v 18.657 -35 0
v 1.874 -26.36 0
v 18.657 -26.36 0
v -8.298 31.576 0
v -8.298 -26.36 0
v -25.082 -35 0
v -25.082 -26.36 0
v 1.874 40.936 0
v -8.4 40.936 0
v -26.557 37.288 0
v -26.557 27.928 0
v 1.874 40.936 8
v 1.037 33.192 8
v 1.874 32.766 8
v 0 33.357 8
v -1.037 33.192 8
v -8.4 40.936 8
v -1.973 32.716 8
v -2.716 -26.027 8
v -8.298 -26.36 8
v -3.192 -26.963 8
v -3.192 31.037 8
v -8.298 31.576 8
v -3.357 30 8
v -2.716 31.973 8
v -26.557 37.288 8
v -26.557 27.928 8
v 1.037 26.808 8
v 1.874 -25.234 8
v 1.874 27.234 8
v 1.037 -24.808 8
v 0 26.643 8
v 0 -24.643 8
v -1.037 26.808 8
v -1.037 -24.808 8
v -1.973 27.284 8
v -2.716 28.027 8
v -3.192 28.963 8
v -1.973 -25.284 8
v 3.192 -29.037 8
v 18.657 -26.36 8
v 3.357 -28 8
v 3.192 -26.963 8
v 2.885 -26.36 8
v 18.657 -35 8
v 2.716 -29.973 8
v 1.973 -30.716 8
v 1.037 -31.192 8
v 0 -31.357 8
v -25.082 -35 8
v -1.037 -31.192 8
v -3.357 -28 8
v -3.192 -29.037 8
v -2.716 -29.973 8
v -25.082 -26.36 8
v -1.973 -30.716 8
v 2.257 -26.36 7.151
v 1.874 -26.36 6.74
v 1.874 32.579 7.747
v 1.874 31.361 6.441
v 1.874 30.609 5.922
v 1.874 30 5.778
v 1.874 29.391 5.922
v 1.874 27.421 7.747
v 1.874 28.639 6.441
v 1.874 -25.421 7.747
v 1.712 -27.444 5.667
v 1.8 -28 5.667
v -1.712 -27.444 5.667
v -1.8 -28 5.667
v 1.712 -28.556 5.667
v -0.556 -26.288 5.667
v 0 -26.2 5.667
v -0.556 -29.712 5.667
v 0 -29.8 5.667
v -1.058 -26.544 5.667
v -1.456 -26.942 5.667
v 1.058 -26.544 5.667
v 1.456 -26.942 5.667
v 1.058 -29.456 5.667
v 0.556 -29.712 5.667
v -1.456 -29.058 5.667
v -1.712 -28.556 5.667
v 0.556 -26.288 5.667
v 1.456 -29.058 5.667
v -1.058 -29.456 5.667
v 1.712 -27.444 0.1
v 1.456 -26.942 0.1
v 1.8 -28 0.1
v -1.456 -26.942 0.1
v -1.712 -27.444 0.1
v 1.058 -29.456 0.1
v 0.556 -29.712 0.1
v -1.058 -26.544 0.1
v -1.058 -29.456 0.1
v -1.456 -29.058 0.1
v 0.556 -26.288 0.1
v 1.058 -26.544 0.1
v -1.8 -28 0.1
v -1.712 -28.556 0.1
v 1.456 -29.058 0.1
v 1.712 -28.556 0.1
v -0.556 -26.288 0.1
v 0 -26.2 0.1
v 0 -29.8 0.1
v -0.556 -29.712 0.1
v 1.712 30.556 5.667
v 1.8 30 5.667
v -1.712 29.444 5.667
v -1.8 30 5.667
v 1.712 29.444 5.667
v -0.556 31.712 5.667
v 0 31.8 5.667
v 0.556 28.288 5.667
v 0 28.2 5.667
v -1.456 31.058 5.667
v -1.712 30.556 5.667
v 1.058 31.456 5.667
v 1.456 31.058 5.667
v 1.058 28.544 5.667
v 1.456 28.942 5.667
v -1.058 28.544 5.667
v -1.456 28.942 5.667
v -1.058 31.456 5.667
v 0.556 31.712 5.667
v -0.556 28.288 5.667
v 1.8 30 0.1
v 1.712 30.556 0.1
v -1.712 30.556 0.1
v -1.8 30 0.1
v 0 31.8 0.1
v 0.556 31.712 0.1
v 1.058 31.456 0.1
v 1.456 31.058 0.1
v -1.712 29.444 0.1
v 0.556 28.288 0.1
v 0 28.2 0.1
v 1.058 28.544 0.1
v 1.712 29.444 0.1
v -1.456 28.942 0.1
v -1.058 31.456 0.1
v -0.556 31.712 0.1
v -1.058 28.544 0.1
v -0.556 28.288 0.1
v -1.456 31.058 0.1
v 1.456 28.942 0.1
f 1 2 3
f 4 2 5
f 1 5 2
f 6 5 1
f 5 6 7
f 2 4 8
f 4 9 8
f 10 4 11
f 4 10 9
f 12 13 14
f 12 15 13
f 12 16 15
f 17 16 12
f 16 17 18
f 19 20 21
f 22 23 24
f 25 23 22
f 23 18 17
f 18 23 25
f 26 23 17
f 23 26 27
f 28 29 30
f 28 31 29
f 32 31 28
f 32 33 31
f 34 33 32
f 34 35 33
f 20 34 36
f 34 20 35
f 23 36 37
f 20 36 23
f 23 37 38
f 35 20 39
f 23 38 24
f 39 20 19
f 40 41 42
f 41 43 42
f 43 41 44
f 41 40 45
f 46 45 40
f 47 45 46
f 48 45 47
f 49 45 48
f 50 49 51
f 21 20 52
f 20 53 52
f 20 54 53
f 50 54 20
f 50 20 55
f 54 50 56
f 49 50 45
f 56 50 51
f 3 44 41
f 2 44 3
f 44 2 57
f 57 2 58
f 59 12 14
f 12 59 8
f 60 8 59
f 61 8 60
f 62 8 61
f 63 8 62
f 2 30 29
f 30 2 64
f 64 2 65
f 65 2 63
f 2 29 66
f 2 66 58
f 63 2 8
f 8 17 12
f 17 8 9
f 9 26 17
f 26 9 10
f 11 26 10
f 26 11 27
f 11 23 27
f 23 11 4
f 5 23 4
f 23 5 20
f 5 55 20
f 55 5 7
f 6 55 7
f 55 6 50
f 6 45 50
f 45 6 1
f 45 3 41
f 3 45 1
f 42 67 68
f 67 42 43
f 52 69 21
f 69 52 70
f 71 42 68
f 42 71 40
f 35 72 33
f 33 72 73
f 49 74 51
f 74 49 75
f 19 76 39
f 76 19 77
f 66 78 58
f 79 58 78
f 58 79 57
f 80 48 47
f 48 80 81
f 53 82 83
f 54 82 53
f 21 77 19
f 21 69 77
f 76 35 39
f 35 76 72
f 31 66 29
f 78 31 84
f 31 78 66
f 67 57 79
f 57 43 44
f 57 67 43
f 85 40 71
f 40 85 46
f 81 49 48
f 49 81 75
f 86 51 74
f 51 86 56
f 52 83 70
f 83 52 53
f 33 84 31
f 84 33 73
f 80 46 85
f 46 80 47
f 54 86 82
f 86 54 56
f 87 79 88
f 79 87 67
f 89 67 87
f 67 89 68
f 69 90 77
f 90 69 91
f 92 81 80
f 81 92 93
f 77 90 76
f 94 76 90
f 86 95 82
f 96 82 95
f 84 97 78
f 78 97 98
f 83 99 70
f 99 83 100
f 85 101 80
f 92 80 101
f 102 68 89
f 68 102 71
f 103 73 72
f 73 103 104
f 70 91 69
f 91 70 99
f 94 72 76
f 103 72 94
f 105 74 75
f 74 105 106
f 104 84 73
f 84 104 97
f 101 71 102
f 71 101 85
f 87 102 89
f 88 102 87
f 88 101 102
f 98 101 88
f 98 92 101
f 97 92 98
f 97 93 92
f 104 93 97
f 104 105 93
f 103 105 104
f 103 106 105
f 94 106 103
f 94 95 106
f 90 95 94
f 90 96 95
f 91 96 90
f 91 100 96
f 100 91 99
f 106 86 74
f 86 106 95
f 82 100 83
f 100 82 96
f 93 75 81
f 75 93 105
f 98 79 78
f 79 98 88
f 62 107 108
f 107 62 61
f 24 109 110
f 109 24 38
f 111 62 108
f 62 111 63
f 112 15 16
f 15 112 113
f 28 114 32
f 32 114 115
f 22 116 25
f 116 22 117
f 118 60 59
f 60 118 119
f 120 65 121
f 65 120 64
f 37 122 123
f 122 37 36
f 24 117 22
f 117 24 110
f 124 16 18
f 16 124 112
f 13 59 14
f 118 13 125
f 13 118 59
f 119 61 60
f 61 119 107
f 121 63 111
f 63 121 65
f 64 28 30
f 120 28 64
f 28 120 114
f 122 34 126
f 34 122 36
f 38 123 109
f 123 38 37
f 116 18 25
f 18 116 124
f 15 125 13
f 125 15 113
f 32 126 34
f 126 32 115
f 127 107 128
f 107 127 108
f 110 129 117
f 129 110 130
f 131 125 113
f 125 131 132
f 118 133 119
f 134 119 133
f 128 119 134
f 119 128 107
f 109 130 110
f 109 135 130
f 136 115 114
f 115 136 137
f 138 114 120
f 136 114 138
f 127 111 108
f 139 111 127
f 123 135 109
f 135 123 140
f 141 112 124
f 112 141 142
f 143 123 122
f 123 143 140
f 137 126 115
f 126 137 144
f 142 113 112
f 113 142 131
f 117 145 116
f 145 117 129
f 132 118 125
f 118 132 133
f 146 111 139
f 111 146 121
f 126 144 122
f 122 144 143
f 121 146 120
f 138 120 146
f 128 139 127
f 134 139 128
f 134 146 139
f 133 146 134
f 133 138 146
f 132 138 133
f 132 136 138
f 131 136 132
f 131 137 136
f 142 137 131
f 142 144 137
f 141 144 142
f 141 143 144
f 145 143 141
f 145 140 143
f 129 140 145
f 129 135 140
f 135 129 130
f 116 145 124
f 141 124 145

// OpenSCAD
// Street Numbers for 3D printing
// Charles Tilford, 2019
// License: CC BY-NC-SA 4.0
//   https://creativecommons.org/licenses/by-nc-sa/4.0/

char="1";     // The number/letter to print

// Units are in mm, except for height of letter

// How many inches high should letter be?
inchesHigh=3;
// How thick/deep should letter be (mm)?
depth=8;

// Character coordinates just center the letter
charX=-38;    // Character X coord
charY=-35;    // Character Y coord
topScrew=30;  // Top screw Y coord
botScrew=-28; // Bottom screw Y coord
height=8;     // Thickness of character
// Screw dimensions. Default presumes
// #6 sheet metal screw
screwWid=3.6; // Width of screw shaft
screwTop=6.78;// Width of screw head
screwCon=5.08;// Height of head 'cone'

// Font to print in. Your system needs this
// installed, of course. If changed the hole
// positions almost certainly need to be
// changed, and maybe charX/charY.
fName="Open Sans Extrabold";
// https://fonts.google.com/specimen/Open+Sans
// Designer: Steve Matteson

// Thin floor below holes. My printer was
// struggling to have the hole 'border' stick
// to the stage. Just drill/screw thru it.
holeFloor=0.1; 

// ==========================================
// ===== All values below are auto-calculated
// ==========================================

// Scaled values
scaleFactor=inchesHigh / 3;
cX=charX * scaleFactor;
cY=charY * scaleFactor;
tS=topScrew * scaleFactor;
bS=botScrew * scaleFactor;
// Where do we start drawing screw head cone?
oS=depth - (screwCon-.05);

difference() {
  // We use difference() to punch out the screw holes
  // in the character
    
  // The character itself, 8mm thick
  translate([cX,cY,0])
    linear_extrude(height=depth, scale=1)
    text(char, size=(75*scaleFactor),
         $fn=100, font=fName);
    
  // Bottom screw hole
  translate([0,bS,oS]) color("red")
    cylinder(h=screwCon, d2=screwTop,
             d1=0, $fn=20);
   translate([0,bS,holeFloor])
    cylinder(h=20, d=screwWid, $fn=20);
    
  // Top screw hole
  translate([0,tS,oS]) color("red")
    cylinder(h=screwCon, d2=screwTop,
             d1=0, $fn=20);
  translate([0,tS,holeFloor])
    cylinder(h=20, d=screwWid, $fn=20);
}

// Colors are just to aid visualization of
// void spaces. $fn is "featuer number", ie how
// many polygons are devoted to object. The values
// above should be near your printing limit anyway.

// Developed in OpenSCAD
//    https://www.openscad.org/
